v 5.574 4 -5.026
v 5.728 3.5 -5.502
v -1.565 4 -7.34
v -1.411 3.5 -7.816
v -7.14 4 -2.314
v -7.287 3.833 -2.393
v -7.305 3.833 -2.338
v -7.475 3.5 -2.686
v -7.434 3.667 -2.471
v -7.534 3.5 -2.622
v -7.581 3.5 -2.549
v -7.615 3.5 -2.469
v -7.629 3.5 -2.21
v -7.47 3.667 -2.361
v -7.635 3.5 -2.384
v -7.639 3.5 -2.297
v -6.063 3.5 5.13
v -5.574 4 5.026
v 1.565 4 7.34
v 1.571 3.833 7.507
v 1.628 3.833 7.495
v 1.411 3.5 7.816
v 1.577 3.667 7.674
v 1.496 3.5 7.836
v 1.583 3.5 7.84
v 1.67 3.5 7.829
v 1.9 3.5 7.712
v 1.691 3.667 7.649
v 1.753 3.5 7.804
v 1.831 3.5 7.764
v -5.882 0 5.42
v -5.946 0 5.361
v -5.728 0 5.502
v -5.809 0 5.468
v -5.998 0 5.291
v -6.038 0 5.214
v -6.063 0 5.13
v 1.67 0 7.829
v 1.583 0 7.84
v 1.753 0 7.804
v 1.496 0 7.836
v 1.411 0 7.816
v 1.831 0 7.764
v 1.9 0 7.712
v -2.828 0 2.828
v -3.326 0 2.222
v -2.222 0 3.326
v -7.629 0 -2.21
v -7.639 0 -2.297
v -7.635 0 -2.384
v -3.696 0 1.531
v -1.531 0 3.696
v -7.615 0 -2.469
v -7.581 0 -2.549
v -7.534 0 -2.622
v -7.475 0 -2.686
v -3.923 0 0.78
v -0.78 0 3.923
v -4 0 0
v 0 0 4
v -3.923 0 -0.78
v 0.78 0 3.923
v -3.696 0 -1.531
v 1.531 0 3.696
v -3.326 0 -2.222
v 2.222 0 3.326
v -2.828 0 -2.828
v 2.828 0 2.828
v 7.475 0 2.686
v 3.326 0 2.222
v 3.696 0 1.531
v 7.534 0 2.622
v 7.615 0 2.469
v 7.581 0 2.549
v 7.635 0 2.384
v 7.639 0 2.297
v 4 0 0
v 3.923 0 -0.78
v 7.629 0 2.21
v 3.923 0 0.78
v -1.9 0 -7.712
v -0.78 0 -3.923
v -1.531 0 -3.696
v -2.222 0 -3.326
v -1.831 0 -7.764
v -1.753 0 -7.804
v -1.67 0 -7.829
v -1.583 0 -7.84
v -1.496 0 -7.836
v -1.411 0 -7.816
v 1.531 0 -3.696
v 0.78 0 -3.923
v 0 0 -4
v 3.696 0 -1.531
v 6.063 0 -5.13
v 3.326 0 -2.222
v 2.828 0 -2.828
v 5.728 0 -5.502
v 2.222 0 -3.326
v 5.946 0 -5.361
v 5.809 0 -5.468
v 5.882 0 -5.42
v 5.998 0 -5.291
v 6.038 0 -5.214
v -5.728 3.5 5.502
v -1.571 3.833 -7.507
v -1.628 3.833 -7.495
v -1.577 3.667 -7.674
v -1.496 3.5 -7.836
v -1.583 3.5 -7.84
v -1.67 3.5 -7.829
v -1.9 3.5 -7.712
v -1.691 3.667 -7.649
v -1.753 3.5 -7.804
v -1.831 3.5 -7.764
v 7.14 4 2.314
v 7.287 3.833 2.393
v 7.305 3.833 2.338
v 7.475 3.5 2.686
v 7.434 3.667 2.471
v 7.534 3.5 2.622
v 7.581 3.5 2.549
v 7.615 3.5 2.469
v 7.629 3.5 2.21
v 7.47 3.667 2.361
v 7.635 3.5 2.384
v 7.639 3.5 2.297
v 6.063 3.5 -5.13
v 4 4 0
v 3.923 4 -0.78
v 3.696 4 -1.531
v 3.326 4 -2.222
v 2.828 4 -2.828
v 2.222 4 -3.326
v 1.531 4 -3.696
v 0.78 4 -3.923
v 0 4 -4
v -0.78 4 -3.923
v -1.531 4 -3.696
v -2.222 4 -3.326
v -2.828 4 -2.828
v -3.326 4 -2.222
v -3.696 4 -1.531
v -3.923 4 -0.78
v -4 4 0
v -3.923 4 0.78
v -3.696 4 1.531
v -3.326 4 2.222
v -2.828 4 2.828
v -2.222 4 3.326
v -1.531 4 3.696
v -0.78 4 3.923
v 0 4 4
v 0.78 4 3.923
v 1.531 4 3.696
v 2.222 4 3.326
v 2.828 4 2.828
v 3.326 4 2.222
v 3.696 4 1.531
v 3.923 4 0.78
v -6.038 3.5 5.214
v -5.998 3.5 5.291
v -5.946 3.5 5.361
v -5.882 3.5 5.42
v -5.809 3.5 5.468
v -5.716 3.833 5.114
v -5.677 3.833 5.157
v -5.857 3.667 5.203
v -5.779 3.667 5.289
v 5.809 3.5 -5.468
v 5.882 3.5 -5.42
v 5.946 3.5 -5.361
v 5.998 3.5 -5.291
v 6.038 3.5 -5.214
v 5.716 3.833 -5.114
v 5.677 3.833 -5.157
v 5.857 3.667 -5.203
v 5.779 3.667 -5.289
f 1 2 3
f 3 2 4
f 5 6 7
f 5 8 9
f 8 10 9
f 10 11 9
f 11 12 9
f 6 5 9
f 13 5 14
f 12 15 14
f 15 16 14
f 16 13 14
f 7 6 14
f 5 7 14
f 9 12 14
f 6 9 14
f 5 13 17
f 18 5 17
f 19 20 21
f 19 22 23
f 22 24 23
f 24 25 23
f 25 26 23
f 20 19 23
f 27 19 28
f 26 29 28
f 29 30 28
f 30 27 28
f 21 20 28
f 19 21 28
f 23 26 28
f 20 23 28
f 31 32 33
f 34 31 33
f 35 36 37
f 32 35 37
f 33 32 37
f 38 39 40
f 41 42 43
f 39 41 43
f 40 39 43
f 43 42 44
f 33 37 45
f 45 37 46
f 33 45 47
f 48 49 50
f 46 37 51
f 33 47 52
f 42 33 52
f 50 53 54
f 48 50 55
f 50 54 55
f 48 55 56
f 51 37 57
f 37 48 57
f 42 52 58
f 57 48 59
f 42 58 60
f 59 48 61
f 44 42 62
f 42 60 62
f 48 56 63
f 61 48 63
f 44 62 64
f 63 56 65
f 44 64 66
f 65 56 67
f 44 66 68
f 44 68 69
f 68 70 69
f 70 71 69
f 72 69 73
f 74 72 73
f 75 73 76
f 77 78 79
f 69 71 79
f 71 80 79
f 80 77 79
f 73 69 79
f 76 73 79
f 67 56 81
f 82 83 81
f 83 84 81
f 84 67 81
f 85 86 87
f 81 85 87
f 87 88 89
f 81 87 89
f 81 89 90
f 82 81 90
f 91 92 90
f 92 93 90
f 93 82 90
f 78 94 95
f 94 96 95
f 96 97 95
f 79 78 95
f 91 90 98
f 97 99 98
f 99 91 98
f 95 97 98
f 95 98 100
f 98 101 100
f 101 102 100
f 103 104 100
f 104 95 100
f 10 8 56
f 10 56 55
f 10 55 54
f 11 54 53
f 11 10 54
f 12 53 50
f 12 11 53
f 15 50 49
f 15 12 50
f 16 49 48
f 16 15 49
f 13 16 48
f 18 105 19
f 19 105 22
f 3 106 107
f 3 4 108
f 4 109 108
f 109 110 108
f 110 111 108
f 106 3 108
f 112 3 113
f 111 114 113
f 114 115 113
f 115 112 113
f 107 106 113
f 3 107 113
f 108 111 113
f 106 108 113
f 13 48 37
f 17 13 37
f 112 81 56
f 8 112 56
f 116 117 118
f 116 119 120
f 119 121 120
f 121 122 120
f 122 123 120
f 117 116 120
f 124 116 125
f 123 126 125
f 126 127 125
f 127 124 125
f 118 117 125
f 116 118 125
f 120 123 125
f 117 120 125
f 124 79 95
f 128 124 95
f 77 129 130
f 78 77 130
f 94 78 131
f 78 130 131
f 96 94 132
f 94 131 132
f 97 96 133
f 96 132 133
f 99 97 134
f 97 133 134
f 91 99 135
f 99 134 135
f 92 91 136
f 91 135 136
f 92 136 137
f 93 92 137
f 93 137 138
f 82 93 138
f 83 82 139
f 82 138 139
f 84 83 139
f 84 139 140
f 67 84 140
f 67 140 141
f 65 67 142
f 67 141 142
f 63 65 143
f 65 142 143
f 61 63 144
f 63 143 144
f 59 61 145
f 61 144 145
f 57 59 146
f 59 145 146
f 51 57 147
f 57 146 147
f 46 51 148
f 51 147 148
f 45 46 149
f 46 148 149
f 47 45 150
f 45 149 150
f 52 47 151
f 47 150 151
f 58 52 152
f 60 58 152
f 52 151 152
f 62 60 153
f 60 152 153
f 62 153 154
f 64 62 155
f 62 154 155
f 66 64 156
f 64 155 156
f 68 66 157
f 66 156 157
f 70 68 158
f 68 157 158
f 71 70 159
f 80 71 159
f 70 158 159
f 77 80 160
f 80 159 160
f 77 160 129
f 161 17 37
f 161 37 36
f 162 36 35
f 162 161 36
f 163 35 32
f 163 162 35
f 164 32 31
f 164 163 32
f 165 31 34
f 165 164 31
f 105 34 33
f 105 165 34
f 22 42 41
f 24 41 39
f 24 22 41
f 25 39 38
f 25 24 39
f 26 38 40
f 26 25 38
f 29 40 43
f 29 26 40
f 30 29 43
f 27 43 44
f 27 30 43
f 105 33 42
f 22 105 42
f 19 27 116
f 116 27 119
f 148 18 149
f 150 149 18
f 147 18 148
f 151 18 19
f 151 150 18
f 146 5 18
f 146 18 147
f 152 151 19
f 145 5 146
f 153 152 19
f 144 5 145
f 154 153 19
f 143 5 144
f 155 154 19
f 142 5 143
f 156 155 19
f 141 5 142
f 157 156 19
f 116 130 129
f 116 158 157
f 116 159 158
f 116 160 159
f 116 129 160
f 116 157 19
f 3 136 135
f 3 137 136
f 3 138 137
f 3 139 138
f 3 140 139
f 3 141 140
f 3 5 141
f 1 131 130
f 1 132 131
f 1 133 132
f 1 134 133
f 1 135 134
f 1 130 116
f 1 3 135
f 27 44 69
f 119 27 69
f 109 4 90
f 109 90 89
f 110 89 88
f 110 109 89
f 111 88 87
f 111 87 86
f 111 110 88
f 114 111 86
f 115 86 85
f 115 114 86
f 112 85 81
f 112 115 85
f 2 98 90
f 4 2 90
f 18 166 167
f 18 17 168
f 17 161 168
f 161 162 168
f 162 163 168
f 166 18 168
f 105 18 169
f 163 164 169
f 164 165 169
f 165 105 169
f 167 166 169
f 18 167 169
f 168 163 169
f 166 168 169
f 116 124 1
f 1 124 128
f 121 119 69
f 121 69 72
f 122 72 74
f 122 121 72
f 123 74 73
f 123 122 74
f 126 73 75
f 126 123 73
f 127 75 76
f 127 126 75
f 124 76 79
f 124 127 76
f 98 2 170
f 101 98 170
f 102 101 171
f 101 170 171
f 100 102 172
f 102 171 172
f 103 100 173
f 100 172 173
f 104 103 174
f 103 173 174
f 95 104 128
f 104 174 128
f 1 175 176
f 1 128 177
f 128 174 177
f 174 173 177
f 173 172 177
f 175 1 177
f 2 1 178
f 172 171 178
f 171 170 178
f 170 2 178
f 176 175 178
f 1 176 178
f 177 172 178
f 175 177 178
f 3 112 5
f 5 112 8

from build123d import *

# Parameters (mm, degrees)
BOSS_EXTRUDE1_DEPTH     = 4
FILLET1_R               = 0.5
CHAMFER1_SIZE           = 0.5
CUT_EXTRUDE1_DEPTH      = 4
CUT_EXTRUDE1_DEPTH_BACK = 4
SKETCH2_R               = 4


with BuildPart() as part:
    # Sketch1 → Boss-Extrude1 (new body)
    with BuildSketch(Plane(origin=(0, 0, 0), x_dir=(1, 0, 0), z_dir=(0, 1, 0))):
        Polygon((6.003079224, 5.412612415), (-1.68592024, 7.905125317), (-7.688999465, 2.492512902), (-6.003079224, -5.412612415), (1.68592024, -7.905125317), (7.688999465, -2.492512902), align=None)
    extrude(amount=BOSS_EXTRUDE1_DEPTH)

    # Fillet1
    fillet1_edges = [part.edges().sort_by_distance(p)[0] for p in [
        (7.688999465, 2, 2.492512902),
        (-6.003079224, 2, 5.412612415),
        (-7.688999465, 2, -2.492512902),
        (-1.68592024, 2, -7.905125317),
        (6.003079224, 2, -5.412612415),
        (1.68592024, 2, 7.905125317),
    ]]
    fillet(fillet1_edges, radius=FILLET1_R)

    # Chamfer1
    chamfer1_edges = [part.edges().sort_by_distance(p)[0] for p in [
        (2.158579492, 4, -6.658868866),
        (-1.669786634, 4, -7.829476319),
        (5.945632073, 4, -5.360815804),
        (-4.687459853, 4, -5.198819109),
        (6.846039345, 4, -1.460049757),
        (-7.615418708, 4, -2.468660515),
        (7.615418708, 4, 2.468660515),
        (-6.846039345, 4, 1.460049757),
        (4.687459853, 4, 5.198819109),
        (-5.945632073, 4, 5.360815804),
        (1.669786634, 4, 7.829476319),
        (-2.158579492, 4, 6.658868866),
    ]]
    chamfer(chamfer1_edges, length=CHAMFER1_SIZE)

    # Sketch2 → Cut-Extrude1 (cut, two sides: drawn at the far end of the back side and taken through both)
    with BuildSketch(Plane(origin=(0, 4, 0), x_dir=(1, 0, 0), z_dir=(0, 1, 0)).offset(-CUT_EXTRUDE1_DEPTH_BACK)):
        Circle(SKETCH2_R)
    extrude(amount=CUT_EXTRUDE1_DEPTH + CUT_EXTRUDE1_DEPTH_BACK, mode=Mode.SUBTRACT)


solid = part.part
